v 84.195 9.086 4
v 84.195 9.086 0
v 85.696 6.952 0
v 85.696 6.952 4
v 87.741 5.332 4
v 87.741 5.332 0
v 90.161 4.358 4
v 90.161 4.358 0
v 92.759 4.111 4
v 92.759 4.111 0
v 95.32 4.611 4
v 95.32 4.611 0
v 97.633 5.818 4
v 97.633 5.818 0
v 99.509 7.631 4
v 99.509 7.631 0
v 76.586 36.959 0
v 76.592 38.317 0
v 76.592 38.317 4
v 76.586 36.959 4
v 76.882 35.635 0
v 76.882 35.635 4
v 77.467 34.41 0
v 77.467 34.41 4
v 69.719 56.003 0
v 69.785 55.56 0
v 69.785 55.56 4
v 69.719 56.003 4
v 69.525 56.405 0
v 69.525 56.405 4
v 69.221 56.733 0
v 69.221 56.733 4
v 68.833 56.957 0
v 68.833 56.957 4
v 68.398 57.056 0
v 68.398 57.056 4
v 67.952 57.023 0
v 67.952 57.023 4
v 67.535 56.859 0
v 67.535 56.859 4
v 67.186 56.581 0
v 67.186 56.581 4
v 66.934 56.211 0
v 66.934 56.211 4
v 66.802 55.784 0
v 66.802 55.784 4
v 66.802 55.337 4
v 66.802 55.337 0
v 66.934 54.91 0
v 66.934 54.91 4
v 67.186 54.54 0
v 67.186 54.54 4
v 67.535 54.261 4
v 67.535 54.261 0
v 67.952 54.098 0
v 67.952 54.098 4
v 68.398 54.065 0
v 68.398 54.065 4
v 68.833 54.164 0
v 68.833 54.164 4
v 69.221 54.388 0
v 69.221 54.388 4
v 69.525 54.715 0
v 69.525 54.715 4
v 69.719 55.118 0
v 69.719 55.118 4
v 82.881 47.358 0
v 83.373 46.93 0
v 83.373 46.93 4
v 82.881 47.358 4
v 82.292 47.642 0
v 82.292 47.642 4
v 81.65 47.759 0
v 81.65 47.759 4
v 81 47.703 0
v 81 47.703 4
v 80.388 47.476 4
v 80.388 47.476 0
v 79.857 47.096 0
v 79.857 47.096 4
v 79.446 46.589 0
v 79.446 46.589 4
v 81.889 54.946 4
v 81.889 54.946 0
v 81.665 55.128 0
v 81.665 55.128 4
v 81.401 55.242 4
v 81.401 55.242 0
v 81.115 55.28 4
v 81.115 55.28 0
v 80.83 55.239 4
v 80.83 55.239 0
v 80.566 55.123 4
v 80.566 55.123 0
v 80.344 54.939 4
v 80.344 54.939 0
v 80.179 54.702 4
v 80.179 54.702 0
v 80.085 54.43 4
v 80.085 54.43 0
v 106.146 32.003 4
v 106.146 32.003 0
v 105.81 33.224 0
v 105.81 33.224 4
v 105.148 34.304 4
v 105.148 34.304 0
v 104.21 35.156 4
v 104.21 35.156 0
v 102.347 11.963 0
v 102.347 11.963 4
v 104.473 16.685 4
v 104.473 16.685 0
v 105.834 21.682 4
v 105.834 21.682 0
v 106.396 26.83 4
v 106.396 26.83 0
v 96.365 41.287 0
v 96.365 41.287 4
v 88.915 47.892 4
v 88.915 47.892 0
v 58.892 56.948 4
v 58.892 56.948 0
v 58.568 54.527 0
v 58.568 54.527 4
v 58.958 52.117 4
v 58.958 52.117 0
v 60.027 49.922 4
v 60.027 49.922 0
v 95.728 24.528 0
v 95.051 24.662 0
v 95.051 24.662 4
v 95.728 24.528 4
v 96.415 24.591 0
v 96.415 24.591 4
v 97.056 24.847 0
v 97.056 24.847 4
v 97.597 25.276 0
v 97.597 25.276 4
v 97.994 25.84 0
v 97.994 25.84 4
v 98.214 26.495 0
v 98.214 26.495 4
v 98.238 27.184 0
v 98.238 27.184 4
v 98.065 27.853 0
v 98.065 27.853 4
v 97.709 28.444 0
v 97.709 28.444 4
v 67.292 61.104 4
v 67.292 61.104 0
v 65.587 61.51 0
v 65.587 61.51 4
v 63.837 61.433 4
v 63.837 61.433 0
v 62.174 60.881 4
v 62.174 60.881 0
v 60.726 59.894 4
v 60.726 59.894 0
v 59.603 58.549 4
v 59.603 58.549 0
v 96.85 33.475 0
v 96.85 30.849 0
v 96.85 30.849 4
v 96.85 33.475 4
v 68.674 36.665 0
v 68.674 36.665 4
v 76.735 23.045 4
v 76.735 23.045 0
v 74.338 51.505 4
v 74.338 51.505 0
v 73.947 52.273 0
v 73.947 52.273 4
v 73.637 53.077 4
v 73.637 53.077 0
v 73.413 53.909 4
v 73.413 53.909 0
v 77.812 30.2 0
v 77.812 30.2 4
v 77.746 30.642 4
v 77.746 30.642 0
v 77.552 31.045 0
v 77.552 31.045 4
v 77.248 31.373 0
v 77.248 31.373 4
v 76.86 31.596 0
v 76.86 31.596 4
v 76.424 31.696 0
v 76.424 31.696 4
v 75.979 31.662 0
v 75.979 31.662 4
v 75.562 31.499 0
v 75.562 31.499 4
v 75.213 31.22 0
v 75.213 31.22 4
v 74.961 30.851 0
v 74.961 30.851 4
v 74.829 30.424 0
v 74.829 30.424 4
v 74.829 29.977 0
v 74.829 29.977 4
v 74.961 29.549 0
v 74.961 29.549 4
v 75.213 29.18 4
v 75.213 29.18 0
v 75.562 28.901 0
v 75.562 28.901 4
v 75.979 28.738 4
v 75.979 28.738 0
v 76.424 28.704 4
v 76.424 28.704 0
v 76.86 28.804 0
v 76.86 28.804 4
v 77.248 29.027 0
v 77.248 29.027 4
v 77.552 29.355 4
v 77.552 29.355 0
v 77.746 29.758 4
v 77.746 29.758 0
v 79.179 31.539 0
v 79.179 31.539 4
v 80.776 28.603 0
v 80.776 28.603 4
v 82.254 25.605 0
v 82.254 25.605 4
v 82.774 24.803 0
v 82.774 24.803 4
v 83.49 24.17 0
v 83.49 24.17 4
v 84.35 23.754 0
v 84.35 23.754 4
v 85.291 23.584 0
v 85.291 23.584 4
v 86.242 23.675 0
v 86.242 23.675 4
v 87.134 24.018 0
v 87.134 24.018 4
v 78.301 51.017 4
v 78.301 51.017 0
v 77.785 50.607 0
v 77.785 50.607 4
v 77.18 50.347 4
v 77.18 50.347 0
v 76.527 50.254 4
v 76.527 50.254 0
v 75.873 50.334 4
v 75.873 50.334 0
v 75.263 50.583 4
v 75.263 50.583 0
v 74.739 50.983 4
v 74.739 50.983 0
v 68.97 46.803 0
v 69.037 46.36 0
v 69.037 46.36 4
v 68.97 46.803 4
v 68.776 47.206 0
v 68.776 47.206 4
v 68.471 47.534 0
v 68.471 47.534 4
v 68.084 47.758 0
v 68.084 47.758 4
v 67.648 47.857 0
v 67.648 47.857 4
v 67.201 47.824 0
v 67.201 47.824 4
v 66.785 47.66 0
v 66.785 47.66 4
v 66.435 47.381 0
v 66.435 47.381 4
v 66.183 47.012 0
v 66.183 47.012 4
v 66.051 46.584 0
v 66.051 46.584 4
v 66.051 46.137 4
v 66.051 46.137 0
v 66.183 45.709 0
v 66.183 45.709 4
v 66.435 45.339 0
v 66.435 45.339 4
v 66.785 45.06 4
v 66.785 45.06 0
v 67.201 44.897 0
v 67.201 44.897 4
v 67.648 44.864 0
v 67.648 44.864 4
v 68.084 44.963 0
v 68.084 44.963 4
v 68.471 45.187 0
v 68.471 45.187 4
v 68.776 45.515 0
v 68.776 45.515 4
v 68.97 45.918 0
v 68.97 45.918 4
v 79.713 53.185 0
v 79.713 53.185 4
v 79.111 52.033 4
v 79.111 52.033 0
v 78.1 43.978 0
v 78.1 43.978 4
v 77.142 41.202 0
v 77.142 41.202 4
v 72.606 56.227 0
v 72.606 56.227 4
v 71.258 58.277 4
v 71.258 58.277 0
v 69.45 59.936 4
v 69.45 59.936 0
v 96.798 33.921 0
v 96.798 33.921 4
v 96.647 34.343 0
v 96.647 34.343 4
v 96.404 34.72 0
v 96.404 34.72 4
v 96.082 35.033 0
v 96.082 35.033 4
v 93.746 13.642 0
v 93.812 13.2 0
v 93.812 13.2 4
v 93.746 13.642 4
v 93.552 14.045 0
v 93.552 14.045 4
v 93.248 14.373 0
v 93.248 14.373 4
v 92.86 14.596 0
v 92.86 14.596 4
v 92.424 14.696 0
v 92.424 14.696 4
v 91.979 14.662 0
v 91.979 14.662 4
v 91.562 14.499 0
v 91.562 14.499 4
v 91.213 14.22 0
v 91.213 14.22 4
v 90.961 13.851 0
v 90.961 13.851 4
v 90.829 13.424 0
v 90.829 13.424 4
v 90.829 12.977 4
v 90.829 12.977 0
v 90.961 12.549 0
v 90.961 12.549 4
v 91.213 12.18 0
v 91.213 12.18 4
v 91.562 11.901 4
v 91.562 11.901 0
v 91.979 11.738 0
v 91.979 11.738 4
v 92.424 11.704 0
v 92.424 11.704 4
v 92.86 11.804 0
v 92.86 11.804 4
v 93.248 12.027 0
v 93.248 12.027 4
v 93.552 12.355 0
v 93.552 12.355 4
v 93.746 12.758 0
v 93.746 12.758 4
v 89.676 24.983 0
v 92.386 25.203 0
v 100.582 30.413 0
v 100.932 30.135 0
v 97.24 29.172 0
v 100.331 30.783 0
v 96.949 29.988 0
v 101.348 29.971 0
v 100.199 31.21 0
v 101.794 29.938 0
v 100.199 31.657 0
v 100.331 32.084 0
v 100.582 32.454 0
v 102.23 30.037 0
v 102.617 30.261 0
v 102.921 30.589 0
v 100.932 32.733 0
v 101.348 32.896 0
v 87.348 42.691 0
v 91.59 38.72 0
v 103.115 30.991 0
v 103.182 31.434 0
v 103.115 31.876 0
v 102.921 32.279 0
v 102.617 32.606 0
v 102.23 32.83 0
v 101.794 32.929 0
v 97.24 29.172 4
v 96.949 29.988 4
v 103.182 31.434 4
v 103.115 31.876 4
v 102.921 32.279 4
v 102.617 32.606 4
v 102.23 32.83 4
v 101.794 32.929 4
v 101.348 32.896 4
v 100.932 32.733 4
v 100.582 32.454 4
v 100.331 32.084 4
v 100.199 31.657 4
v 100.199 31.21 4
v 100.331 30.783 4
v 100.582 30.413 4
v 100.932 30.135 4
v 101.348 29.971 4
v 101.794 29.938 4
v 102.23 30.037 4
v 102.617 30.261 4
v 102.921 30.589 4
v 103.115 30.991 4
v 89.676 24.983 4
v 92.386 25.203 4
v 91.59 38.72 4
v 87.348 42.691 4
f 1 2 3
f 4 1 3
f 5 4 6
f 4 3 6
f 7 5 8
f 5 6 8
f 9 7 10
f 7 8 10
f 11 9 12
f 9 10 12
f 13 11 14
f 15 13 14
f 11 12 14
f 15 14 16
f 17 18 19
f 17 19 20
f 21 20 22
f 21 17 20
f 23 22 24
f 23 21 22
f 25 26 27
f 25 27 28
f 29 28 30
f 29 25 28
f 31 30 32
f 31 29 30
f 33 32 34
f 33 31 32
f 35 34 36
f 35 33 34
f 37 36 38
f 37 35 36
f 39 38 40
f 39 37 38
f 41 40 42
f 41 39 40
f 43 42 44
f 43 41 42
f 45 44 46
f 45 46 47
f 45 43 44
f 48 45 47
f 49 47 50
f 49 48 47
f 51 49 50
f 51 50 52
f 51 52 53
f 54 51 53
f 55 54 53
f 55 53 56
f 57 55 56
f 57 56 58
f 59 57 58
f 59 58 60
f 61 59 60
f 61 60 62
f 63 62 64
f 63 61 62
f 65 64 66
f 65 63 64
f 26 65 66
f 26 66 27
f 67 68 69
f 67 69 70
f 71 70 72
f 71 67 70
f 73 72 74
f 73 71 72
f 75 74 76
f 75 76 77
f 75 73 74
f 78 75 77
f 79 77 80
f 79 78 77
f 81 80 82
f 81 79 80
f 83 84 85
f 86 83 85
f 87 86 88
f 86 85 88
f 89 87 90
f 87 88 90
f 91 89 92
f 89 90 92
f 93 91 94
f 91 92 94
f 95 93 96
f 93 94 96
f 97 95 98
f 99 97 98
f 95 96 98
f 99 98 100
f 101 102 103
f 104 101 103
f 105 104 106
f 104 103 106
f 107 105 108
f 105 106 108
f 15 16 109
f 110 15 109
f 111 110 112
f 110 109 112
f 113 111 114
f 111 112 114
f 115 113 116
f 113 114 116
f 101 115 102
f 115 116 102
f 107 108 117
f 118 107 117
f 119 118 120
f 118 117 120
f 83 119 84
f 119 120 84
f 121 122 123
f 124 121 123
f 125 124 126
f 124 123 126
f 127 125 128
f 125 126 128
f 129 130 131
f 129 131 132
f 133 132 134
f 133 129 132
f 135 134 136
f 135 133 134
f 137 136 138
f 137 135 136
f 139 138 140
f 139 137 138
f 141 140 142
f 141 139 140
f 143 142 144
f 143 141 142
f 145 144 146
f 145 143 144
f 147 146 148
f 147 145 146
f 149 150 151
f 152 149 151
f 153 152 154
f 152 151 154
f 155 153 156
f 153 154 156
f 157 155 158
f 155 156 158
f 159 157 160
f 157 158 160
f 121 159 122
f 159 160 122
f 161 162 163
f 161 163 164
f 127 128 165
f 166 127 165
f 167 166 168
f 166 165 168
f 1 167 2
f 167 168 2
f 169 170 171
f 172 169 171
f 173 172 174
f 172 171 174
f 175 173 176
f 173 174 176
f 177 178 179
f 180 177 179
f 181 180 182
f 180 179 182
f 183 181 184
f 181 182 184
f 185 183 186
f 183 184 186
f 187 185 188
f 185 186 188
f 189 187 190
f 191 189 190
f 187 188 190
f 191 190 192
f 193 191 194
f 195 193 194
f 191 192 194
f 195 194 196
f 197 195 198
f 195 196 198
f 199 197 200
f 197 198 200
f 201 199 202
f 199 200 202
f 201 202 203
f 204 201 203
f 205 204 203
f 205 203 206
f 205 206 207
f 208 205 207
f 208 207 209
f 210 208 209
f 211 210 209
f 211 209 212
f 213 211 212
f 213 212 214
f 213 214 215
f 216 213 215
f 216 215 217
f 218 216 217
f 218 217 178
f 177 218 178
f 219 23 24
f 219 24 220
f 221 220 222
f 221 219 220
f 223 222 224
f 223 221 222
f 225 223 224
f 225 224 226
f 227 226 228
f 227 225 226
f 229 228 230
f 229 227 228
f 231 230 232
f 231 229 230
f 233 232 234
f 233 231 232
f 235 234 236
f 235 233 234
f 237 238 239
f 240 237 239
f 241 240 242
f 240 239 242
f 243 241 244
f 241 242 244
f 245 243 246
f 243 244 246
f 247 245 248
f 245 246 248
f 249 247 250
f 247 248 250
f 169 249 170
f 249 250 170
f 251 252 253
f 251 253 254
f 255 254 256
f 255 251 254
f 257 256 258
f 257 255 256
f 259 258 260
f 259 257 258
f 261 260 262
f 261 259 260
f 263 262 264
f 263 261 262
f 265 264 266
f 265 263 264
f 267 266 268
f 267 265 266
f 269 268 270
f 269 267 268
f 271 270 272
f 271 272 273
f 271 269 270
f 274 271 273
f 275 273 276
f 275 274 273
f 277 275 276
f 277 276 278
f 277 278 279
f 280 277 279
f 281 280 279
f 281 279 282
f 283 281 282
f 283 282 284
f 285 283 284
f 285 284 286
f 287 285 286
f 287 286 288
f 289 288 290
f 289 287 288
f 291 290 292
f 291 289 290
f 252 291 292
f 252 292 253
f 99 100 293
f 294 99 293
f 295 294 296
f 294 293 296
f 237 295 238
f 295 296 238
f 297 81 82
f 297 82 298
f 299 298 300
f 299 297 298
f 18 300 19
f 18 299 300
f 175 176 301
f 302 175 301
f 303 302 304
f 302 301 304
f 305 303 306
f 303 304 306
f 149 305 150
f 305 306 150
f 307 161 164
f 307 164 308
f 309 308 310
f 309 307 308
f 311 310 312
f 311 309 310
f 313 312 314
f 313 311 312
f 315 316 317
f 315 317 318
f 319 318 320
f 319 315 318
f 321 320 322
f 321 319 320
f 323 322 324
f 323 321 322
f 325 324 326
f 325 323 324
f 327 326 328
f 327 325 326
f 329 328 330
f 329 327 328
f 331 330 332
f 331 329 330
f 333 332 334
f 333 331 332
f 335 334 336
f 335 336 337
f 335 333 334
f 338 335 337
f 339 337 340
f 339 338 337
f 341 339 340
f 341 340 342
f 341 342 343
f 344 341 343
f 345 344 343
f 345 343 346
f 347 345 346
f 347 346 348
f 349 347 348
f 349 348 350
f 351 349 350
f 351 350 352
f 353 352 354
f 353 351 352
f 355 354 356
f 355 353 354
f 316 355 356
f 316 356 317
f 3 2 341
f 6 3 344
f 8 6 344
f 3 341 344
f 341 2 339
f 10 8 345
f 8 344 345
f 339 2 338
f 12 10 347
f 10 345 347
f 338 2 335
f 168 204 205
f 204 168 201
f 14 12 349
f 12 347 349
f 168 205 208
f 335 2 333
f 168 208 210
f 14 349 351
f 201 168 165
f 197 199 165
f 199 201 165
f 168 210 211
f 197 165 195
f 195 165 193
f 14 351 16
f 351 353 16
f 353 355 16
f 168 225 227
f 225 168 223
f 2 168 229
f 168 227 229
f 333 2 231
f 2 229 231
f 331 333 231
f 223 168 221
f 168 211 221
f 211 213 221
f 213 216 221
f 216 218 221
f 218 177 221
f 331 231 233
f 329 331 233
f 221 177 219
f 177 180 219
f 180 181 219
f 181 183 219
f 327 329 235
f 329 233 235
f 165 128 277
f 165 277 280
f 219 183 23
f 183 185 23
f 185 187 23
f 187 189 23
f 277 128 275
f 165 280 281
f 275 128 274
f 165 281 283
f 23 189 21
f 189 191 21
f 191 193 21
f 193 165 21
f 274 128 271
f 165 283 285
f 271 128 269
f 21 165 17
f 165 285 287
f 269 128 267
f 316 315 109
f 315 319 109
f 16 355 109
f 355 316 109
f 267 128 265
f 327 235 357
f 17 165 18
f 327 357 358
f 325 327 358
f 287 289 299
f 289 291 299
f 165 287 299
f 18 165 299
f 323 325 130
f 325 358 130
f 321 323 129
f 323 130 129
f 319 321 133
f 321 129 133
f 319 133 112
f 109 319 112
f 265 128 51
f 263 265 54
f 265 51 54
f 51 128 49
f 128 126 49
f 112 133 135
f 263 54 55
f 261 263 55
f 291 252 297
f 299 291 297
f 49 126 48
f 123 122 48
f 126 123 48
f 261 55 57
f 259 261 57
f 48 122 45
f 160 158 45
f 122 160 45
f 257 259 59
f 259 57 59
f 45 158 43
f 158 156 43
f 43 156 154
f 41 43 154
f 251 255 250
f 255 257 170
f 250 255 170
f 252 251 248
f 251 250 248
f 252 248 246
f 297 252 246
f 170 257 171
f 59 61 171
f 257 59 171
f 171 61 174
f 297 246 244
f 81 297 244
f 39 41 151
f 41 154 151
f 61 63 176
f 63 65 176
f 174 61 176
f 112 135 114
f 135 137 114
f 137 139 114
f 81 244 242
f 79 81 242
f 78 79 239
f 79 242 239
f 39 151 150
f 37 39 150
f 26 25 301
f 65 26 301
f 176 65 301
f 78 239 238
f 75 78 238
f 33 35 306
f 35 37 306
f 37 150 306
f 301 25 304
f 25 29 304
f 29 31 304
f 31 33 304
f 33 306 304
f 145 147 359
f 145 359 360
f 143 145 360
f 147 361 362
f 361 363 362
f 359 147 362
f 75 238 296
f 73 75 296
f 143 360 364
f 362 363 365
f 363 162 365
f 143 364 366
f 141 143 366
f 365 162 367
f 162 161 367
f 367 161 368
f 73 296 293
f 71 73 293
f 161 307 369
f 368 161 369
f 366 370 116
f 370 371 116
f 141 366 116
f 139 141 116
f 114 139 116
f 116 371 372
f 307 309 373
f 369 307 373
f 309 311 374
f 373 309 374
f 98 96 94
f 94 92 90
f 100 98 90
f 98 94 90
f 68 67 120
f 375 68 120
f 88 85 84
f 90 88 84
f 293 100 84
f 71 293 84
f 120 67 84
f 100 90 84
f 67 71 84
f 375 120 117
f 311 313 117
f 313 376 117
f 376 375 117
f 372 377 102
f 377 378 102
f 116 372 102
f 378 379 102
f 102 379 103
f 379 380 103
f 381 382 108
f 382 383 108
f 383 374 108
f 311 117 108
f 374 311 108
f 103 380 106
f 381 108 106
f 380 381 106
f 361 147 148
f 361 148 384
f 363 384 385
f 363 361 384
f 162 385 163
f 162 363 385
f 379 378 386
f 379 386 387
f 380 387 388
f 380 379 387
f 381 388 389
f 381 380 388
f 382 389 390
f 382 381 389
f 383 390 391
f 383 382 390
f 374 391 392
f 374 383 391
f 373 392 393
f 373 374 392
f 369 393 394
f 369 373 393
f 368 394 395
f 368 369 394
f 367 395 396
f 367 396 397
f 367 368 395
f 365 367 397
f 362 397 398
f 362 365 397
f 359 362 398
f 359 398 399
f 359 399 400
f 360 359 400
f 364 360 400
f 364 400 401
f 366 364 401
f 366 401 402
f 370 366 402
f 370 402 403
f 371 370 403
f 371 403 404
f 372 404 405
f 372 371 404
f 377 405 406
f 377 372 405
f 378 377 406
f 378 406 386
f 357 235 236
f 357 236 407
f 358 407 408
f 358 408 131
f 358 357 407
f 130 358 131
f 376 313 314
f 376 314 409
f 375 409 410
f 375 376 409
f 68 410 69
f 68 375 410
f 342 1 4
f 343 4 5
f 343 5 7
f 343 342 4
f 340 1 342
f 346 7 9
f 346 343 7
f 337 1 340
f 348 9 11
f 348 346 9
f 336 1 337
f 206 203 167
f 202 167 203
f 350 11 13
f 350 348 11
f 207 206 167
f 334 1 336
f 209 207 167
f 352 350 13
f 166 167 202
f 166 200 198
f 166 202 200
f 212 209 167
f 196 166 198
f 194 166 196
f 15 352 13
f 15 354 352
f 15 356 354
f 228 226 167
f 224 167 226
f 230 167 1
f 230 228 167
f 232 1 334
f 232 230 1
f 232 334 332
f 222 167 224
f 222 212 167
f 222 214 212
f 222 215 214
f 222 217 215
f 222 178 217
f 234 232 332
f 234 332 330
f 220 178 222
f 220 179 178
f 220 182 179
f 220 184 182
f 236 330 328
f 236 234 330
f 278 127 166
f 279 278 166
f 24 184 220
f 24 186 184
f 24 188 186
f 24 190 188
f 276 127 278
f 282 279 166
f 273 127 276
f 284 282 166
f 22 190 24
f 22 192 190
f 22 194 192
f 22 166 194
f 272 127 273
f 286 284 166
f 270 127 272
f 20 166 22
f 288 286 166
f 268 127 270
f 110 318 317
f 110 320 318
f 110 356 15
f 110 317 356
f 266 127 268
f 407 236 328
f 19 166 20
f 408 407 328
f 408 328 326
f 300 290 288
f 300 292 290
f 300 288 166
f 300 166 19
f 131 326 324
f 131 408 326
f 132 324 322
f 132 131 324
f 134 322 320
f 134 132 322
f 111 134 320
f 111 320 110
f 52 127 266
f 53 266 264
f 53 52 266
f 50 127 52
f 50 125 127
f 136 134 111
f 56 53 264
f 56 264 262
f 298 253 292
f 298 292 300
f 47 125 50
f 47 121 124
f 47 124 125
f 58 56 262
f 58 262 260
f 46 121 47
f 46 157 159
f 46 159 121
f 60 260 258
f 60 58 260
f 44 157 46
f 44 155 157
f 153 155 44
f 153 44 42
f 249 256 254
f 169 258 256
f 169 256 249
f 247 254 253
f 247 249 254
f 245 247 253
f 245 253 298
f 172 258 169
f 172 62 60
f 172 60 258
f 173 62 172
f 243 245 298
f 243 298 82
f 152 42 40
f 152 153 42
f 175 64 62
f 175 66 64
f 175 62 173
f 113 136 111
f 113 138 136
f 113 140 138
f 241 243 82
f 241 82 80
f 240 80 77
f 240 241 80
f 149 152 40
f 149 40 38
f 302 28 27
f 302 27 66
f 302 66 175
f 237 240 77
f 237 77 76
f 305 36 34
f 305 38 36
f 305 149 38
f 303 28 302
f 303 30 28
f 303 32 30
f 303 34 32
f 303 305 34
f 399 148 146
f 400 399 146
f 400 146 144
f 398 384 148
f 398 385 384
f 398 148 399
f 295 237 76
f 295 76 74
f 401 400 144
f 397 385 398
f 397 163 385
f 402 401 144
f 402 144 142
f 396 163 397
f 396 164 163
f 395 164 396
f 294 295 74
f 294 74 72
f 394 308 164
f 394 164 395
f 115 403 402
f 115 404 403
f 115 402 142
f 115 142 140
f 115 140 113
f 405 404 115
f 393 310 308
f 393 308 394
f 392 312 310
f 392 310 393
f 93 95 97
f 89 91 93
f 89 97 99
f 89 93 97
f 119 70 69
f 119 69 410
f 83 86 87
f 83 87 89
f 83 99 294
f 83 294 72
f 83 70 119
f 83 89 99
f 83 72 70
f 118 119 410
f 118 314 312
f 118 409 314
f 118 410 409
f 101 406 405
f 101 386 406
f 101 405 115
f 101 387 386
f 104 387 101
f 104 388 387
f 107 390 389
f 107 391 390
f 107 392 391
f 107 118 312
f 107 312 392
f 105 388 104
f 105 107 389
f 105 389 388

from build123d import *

# Parameters (mm, degrees)
ESQUISSE1_R             = 1.5
ESQUISSE1_R_2           = 1.50110642
BOSS_EXTRU_1_DEPTH      = 4
ENL_V_MAT_EXTRU_1_REACH = 124.989
ESQUISSE2_R             = 1.5


with BuildPart() as part:
    # Esquisse1 → Boss.-Extru.1 (new body)
    with BuildSketch(Plane.XY):
        with BuildLine():
            ThreePointArc((60.026944648, 49.921558504), (72.778337749, 29.898863696), (84.195273994, 9.086369847))
            ThreePointArc((84.195273994, 9.086369847), (91.451273571, 4.140927091), (99.509067829, 7.630753106))
            ThreePointArc((99.509067829, 7.630753106), (105.251720368, 19.156706799), (106.145904128, 32.002955361))
            ThreePointArc((106.145904128, 32.002955361), (105.517176975, 33.787686969), (104.210334733, 35.15616353))
            ThreePointArc((104.210334733, 35.15616353), (92.58899703, 44.531440422), (81.889188019, 54.946112475))
            ThreePointArc((81.889188019, 54.946112475), (80.829609942, 55.239205413), (80.085451585, 54.429985101))
            ThreePointArc((80.085451585, 54.429985101), (79.43974416, 52.594599516), (78.30149473, 51.016636729))
            ThreePointArc((78.30149473, 51.016636729), (76.19777745, 50.272546762), (74.337717048, 51.505215238))
            ThreePointArc((74.337717048, 51.505215238), (73.781586954, 52.671085372), (73.412965229, 53.909088553))
            ThreePointArc((73.412965229, 53.909088553), (71.258227235, 58.277263879), (67.291581582, 61.103847288))
            ThreePointArc((67.291581582, 61.103847288), (62.173852637, 60.880940246), (58.891944342, 56.947758957))
            ThreePointArc((58.891944342, 56.947758957), (58.674610839, 53.307878055), (60.026944648, 49.921558504))
        make_face()
        with Locations((68.285467108, 55.560427953)):
            Circle(ESQUISSE1_R, mode=Mode.SUBTRACT)
        with Locations((101.682075096, 31.433543054)):
            Circle(ESQUISSE1_R, mode=Mode.SUBTRACT)
        with Locations((92.312371453, 13.200094295)):
            Circle(ESQUISSE1_R, mode=Mode.SUBTRACT)
        with Locations((67.535467108, 46.360427953)):
            Circle(ESQUISSE1_R_2, mode=Mode.SUBTRACT)
        with BuildLine():
            Line((96.849719723, 30.848999233), (96.849719723, 33.474650871))
            ThreePointArc((96.849719723, 33.474650871), (96.647309876, 34.343108764), (96.081794601, 35.032587793))
            ThreePointArc((96.081794601, 35.032587793), (89.436975045, 40.671042336), (83.372922141, 46.929880801))
            ThreePointArc((83.372922141, 46.929880801), (81.323140328, 47.752609653), (79.445810973, 46.588941858))
            ThreePointArc((79.445810973, 46.588941858), (77.571604785, 42.607109512), (76.591708968, 38.316720036))
            ThreePointArc((76.591708968, 38.316720036), (76.69683067, 36.288635677), (77.467153905, 34.409598995))
            ThreePointArc((77.467153905, 34.409598995), (79.992055499, 30.078906011), (82.254048976, 25.605270433))
            ThreePointArc((82.254048976, 25.605270433), (84.350090923, 23.753861276), (87.134236378, 24.017758597))
            ThreePointArc((87.134236378, 24.017758597), (91.023623533, 25.188476532), (95.051173024, 24.662398573))
            ThreePointArc((95.051173024, 24.662398573), (97.816197879, 25.543673578), (97.709238653, 28.443771474))
            ThreePointArc((97.709238653, 28.443771474), (97.07105369, 29.571903567), (96.849719723, 30.848999233))
        make_face(mode=Mode.SUBTRACT)
    extrude(amount=BOSS_EXTRU_1_DEPTH)

    # Esquisse2 → Enlèv. mat.-Extru.1 (cut, up to next)
    with BuildSketch(Plane.XY.offset(4), mode=Mode.PRIVATE) as enl_v_mat_extru_1_sk1:
        with Locations((76.312371453, 30.200094295)):
            Circle(ESQUISSE2_R)
    enl_v_mat_extru_1_tool1 = extrude(enl_v_mat_extru_1_sk1.sketch, amount=-ENL_V_MAT_EXTRU_1_REACH, mode=Mode.PRIVATE) & part.part
    add(enl_v_mat_extru_1_tool1.solids().sort_by_distance((76.312371, 30.200094, 4))[0], mode=Mode.SUBTRACT)


solid = part.part
